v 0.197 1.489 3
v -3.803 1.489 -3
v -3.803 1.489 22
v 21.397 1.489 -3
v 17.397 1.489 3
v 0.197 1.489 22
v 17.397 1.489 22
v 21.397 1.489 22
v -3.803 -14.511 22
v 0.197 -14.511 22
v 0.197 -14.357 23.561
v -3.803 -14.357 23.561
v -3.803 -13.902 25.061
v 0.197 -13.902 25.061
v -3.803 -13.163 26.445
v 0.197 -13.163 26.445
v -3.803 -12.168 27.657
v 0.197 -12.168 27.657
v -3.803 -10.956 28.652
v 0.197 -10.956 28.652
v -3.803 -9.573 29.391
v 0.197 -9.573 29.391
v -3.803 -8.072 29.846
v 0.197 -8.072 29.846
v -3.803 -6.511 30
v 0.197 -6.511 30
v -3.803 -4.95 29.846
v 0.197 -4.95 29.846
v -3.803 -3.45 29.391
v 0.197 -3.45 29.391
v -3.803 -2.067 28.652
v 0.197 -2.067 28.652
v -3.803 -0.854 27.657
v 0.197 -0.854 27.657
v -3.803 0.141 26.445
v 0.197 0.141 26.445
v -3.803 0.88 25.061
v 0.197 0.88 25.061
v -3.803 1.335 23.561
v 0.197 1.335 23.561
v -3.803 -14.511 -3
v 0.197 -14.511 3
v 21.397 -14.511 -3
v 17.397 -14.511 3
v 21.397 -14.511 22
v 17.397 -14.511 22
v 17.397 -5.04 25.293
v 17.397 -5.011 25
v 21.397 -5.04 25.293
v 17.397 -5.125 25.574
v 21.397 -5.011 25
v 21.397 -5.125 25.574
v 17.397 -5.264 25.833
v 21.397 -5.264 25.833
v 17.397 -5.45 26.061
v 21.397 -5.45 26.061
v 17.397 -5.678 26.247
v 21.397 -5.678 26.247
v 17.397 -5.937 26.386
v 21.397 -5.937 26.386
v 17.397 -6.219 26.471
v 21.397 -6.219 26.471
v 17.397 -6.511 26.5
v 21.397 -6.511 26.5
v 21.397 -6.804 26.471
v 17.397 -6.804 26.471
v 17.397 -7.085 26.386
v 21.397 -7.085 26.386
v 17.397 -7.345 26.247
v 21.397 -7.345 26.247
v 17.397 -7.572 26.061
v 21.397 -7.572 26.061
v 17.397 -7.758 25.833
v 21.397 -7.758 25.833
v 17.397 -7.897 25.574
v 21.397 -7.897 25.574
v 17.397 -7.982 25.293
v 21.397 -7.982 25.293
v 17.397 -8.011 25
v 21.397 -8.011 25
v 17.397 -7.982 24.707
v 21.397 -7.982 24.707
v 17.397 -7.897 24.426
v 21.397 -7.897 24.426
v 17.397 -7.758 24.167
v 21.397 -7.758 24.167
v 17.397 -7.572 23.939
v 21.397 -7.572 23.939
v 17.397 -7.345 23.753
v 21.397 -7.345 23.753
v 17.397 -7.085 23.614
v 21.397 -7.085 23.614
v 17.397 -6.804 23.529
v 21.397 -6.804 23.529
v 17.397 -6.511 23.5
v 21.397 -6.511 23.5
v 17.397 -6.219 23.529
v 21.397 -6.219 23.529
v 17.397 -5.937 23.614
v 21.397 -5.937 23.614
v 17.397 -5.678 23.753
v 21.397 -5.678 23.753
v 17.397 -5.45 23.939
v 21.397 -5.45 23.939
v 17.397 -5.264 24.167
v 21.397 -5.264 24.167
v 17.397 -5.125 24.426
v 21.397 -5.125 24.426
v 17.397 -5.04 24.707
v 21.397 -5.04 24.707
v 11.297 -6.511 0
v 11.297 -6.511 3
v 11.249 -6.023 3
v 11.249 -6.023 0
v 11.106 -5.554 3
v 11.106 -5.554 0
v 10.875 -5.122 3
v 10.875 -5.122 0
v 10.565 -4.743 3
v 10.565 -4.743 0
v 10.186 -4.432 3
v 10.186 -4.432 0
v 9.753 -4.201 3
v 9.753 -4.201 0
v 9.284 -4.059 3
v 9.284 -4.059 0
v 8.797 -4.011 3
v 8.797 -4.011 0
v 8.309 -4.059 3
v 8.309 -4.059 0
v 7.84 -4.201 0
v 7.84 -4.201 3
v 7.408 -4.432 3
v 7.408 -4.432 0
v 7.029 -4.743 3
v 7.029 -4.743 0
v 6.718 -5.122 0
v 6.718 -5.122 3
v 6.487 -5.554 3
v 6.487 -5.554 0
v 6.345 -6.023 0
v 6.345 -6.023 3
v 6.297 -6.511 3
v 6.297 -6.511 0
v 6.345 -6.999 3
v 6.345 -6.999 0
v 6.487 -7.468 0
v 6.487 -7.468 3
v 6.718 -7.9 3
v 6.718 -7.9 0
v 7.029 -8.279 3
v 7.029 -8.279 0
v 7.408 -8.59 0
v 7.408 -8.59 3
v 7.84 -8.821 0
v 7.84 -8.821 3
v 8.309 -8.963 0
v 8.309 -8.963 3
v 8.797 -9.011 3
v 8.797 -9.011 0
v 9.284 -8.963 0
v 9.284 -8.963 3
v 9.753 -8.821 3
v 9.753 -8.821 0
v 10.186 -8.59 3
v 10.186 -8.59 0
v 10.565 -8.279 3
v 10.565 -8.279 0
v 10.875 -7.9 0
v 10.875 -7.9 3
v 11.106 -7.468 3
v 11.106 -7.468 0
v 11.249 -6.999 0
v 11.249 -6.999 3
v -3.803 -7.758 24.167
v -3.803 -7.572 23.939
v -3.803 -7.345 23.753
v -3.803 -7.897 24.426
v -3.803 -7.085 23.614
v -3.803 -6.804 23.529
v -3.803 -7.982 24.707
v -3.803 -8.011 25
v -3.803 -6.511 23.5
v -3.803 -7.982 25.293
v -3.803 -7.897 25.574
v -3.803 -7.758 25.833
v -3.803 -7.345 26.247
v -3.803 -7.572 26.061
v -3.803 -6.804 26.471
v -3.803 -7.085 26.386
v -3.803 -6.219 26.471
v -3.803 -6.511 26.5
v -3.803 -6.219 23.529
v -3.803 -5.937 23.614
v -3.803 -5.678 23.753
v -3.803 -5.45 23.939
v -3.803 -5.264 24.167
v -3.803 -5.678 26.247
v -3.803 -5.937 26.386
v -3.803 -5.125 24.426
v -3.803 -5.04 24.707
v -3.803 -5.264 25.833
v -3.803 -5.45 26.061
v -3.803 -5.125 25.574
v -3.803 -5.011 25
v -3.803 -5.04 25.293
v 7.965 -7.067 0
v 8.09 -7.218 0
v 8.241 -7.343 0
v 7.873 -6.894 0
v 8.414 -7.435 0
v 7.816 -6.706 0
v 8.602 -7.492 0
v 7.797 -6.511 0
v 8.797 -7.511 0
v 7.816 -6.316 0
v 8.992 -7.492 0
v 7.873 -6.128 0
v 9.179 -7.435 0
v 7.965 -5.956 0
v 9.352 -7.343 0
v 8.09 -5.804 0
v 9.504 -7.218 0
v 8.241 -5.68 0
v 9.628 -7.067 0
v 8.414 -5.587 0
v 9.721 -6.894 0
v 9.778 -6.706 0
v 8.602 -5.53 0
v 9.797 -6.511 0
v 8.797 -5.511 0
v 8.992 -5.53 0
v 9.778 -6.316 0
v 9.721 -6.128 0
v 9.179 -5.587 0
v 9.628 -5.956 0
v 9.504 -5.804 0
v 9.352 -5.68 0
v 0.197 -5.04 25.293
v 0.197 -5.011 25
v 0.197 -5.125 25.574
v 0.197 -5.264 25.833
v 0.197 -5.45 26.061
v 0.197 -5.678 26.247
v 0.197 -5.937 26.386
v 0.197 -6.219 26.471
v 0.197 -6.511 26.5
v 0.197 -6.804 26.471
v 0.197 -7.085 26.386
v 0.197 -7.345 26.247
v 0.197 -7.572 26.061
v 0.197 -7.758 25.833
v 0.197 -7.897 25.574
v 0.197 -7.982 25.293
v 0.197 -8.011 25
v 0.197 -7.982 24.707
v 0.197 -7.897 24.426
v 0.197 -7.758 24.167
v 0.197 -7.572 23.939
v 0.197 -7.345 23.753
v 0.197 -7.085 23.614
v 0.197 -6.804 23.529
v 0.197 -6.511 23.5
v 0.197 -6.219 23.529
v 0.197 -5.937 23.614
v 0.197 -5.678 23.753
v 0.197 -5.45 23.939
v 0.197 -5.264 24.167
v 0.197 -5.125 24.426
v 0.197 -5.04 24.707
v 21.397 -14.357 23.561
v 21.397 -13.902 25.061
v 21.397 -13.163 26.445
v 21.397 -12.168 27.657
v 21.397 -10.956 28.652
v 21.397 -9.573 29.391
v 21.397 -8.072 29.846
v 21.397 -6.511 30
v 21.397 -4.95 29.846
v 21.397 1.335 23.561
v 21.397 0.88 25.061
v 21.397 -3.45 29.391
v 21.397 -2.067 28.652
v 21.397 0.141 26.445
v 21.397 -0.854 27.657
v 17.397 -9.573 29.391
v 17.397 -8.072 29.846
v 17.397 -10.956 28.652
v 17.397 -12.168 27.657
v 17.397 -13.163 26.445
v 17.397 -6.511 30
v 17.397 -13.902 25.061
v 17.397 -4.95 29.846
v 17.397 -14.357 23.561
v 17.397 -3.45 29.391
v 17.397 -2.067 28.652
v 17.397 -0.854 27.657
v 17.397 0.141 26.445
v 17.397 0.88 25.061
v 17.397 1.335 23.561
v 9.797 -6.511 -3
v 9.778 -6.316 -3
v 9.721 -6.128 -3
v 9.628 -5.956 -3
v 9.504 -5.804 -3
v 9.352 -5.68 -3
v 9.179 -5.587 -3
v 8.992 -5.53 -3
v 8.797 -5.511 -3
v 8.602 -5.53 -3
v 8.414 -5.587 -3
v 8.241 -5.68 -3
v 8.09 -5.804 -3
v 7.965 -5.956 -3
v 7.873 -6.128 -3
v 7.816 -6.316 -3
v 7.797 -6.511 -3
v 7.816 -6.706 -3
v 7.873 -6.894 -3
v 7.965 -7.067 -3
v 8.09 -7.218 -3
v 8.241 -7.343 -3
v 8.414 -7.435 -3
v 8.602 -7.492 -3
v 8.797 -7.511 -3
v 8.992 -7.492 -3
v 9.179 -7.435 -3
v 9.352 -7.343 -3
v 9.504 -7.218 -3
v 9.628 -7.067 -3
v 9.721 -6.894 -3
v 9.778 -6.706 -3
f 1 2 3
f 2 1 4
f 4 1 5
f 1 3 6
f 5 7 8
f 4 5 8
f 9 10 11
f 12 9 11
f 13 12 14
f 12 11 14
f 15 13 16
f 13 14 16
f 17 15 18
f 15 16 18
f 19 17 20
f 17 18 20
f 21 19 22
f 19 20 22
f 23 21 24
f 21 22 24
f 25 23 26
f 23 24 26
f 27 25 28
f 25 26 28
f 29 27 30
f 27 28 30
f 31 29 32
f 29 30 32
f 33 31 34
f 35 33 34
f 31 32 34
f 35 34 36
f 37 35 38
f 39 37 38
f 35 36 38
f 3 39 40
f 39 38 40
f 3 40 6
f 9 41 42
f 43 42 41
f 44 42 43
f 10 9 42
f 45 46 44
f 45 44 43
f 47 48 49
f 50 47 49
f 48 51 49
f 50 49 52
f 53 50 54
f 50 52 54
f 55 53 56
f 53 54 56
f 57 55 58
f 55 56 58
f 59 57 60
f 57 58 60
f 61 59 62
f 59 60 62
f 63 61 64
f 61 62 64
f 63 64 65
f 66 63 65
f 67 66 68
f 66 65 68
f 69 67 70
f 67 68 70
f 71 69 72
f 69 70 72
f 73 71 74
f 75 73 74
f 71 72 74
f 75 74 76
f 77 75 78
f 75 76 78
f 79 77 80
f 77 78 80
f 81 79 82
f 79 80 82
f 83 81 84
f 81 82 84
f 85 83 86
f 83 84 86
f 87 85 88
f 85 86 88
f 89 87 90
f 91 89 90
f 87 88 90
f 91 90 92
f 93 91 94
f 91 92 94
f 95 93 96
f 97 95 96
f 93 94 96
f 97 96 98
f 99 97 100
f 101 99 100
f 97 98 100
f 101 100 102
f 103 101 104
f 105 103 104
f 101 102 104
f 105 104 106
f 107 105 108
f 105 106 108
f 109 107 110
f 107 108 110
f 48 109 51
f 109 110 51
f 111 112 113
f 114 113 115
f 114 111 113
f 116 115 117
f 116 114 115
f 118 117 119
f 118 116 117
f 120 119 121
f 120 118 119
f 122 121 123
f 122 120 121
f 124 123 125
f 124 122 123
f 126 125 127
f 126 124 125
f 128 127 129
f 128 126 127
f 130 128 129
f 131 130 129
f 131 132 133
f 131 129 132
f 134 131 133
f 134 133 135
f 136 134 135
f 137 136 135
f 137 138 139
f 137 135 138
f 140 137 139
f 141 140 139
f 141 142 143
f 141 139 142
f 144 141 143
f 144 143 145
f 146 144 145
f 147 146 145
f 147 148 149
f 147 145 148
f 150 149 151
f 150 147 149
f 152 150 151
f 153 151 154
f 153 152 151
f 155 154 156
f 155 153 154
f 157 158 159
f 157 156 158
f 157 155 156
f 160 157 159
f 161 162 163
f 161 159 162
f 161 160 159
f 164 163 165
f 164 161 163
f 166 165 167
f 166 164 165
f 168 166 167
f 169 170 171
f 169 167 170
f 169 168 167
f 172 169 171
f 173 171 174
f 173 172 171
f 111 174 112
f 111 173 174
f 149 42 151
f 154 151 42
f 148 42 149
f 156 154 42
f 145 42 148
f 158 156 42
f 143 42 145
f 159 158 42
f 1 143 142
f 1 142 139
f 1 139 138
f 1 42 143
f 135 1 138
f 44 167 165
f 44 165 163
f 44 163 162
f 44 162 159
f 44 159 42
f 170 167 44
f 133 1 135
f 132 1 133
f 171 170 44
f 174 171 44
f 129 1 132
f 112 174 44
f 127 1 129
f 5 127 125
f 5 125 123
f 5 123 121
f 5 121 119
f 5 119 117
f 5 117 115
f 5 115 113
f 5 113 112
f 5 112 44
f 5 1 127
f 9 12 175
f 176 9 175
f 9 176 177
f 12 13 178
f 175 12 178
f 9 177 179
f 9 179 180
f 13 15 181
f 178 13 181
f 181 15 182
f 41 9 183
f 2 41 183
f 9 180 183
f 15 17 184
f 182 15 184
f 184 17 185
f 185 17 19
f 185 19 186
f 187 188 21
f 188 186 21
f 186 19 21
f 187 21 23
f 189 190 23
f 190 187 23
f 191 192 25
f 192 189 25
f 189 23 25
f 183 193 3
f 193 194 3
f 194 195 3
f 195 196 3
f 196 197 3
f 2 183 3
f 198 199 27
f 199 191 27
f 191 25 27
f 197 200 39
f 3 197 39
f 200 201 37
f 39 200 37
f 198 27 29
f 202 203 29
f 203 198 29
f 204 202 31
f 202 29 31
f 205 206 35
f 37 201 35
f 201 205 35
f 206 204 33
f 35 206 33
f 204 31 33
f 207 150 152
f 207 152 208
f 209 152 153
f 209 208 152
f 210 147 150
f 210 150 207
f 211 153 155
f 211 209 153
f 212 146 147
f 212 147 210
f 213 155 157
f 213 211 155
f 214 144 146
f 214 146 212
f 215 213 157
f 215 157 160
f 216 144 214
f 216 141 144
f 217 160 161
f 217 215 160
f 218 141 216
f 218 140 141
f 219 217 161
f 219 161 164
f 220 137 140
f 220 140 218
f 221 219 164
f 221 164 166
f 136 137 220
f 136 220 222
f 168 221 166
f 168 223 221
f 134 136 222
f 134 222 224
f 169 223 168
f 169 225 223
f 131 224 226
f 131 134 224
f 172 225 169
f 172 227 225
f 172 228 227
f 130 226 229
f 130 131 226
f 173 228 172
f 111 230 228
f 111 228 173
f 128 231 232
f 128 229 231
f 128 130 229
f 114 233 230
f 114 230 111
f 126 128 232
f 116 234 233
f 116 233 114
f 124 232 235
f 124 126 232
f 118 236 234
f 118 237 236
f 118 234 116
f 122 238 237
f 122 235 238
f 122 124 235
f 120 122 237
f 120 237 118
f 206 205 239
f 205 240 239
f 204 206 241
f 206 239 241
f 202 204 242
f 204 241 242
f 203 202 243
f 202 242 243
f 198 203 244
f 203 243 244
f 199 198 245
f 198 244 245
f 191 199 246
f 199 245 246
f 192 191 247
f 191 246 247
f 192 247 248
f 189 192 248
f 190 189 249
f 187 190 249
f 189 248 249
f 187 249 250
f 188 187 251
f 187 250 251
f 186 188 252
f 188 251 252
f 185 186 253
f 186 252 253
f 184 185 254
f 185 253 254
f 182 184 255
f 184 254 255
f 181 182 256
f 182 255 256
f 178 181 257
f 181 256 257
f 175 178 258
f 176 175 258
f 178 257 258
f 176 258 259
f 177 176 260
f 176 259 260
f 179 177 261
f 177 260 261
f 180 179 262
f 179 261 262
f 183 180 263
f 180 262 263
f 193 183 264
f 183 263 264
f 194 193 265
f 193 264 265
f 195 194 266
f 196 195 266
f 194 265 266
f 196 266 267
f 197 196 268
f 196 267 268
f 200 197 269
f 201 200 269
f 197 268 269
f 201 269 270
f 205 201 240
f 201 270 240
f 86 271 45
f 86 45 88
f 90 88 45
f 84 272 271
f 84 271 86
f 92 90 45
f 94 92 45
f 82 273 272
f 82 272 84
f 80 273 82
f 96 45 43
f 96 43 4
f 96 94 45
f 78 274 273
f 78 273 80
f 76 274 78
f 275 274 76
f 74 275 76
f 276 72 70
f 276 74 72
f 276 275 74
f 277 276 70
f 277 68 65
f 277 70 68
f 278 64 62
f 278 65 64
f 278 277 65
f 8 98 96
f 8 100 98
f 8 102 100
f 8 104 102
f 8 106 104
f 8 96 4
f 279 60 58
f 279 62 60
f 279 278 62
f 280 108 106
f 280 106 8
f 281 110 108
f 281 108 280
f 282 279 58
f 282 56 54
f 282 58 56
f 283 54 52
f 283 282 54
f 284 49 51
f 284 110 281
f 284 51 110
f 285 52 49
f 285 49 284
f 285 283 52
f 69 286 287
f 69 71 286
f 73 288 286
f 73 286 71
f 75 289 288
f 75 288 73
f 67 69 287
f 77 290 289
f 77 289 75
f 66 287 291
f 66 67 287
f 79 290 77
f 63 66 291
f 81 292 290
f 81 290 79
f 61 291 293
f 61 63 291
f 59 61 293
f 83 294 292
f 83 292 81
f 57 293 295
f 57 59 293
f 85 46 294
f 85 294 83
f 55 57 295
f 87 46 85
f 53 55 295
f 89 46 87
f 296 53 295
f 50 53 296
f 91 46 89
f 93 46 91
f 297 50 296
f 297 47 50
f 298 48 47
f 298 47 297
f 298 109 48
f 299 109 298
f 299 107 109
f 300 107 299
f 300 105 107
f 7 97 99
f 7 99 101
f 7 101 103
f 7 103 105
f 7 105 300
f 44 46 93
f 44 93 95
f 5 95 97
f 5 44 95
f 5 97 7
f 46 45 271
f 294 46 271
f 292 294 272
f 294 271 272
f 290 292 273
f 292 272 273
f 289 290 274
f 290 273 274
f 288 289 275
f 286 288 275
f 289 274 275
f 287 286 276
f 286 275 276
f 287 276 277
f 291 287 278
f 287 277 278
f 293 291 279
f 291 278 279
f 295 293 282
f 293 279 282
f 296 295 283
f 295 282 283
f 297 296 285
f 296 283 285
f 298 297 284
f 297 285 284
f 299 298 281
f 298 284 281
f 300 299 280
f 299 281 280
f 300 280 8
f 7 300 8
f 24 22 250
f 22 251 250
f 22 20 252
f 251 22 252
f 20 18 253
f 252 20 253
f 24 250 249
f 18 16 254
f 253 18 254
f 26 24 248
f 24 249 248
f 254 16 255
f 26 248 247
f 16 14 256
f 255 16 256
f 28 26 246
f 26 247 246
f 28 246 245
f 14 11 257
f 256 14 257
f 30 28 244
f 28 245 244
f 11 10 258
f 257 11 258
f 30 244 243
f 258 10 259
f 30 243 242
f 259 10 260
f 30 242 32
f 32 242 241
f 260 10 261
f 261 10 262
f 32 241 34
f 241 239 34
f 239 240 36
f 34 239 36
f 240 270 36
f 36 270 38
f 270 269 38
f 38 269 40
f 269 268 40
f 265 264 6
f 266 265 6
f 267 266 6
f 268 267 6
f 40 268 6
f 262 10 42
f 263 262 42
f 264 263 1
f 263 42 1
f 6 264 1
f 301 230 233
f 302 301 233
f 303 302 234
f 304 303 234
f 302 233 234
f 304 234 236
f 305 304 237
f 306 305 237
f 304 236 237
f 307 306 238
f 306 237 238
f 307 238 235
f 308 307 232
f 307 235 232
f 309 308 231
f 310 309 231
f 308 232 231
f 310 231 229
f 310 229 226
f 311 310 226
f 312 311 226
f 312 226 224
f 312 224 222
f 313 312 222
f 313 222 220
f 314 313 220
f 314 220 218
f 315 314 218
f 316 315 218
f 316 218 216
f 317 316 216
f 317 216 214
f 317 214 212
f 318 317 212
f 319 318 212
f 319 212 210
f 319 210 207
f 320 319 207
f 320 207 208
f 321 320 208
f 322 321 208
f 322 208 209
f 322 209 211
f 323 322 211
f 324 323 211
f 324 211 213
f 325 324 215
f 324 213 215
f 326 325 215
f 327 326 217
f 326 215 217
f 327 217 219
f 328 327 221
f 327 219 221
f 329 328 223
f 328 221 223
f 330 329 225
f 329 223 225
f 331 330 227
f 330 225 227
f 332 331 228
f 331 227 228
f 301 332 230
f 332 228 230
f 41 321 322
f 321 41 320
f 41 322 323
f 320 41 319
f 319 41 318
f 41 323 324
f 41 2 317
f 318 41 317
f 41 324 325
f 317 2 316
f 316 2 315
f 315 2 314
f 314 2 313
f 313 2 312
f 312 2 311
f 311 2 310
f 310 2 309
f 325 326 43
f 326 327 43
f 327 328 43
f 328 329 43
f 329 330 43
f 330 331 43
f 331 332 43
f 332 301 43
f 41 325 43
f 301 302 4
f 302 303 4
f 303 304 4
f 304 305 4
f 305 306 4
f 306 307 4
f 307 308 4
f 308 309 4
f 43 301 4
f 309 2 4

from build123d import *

# Parameters (mm, degrees)
IZIM1_W                     = 25.2
IZIM1_H                     = 16
Y_KSEKLIK_EKSTR_ZYON1_DEPTH = 3
IZIM3_W                     = 4
IZIM3_H                     = 16
Y_KSEKLIK_EKSTR_ZYON2_DEPTH = 30
KES_EKSTR_ZYON3_DEPTH       = 30
IZIM5_R                     = 1.5
KES_EKSTR_ZYON4_DEPTH       = 30
IZIM6_R                     = 2.5
KES_EKSTR_ZYON5_DEPTH       = 4
IZIM7_R                     = 1
KES_EKSTR_ZYON6_DEPTH       = 15


with BuildPart() as part:
    # Çizim1 → Yükseklik-Ekstrüzyon1 (new, symmetric)
    with BuildSketch(Plane.XY):
        with Locations((8.796736324, -6.511156057)):
            Rectangle(IZIM1_W, IZIM1_H)
    extrude(amount=Y_KSEKLIK_EKSTR_ZYON1_DEPTH, both=True)

    # Çizim3 → Yükseklik-Ekstrüzyon2 (add)
    with BuildSketch(Plane.XY):
        with Locations((-1.803263676, -6.511156057)):
            Rectangle(IZIM3_W, IZIM3_H)
        with Locations((19.396736324, -6.511156057)):
            Rectangle(IZIM3_W, IZIM3_H)
    extrude(amount=Y_KSEKLIK_EKSTR_ZYON2_DEPTH)

    # Çizim4 → Kes-Ekstrüzyon3 (cut, symmetric)
    with BuildSketch(Plane(origin=(0, 0, 0), x_dir=(0, 0, -1), z_dir=(1, 0, 0))):
        with BuildLine():
            Line((-22, 1.488843943), (-31.468609906, 1.488843943))
            Line((-31.468609906, 1.488843943), (-31.468609906, -14.511156057))
            Line((-31.468609906, -14.511156057), (-22, -14.511156057))
            ThreePointArc((-22, -14.511156057), (-30, -6.511156057), (-22, 1.488843943))
        make_face()
    extrude(amount=KES_EKSTR_ZYON3_DEPTH, both=True, mode=Mode.SUBTRACT)

    # Çizim5 → Kes-Ekstrüzyon4 (cut, symmetric)
    with BuildSketch(Plane(origin=(0, 0, 0), x_dir=(0, 0, -1), z_dir=(1, 0, 0))):
        with Locations(Location((-25, -6.511156057, 0), (0, 0, 90))):
            Circle(IZIM5_R)
    extrude(amount=KES_EKSTR_ZYON4_DEPTH, both=True, mode=Mode.SUBTRACT)

    # Çizim6 → Kes-Ekstrüzyon5 (cut)
    with BuildSketch(Plane.XY):
        with Locations((8.796736324, -6.511156057)):
            Circle(IZIM6_R)
    extrude(amount=KES_EKSTR_ZYON5_DEPTH, mode=Mode.SUBTRACT)

    # Çizim7 → Kes-Ekstrüzyon6 (cut)
    with BuildSketch(Plane.XY):
        with Locations((8.796736324, -6.511156057)):
            Circle(IZIM7_R)
    extrude(amount=-KES_EKSTR_ZYON6_DEPTH, mode=Mode.SUBTRACT)


solid = part.part
